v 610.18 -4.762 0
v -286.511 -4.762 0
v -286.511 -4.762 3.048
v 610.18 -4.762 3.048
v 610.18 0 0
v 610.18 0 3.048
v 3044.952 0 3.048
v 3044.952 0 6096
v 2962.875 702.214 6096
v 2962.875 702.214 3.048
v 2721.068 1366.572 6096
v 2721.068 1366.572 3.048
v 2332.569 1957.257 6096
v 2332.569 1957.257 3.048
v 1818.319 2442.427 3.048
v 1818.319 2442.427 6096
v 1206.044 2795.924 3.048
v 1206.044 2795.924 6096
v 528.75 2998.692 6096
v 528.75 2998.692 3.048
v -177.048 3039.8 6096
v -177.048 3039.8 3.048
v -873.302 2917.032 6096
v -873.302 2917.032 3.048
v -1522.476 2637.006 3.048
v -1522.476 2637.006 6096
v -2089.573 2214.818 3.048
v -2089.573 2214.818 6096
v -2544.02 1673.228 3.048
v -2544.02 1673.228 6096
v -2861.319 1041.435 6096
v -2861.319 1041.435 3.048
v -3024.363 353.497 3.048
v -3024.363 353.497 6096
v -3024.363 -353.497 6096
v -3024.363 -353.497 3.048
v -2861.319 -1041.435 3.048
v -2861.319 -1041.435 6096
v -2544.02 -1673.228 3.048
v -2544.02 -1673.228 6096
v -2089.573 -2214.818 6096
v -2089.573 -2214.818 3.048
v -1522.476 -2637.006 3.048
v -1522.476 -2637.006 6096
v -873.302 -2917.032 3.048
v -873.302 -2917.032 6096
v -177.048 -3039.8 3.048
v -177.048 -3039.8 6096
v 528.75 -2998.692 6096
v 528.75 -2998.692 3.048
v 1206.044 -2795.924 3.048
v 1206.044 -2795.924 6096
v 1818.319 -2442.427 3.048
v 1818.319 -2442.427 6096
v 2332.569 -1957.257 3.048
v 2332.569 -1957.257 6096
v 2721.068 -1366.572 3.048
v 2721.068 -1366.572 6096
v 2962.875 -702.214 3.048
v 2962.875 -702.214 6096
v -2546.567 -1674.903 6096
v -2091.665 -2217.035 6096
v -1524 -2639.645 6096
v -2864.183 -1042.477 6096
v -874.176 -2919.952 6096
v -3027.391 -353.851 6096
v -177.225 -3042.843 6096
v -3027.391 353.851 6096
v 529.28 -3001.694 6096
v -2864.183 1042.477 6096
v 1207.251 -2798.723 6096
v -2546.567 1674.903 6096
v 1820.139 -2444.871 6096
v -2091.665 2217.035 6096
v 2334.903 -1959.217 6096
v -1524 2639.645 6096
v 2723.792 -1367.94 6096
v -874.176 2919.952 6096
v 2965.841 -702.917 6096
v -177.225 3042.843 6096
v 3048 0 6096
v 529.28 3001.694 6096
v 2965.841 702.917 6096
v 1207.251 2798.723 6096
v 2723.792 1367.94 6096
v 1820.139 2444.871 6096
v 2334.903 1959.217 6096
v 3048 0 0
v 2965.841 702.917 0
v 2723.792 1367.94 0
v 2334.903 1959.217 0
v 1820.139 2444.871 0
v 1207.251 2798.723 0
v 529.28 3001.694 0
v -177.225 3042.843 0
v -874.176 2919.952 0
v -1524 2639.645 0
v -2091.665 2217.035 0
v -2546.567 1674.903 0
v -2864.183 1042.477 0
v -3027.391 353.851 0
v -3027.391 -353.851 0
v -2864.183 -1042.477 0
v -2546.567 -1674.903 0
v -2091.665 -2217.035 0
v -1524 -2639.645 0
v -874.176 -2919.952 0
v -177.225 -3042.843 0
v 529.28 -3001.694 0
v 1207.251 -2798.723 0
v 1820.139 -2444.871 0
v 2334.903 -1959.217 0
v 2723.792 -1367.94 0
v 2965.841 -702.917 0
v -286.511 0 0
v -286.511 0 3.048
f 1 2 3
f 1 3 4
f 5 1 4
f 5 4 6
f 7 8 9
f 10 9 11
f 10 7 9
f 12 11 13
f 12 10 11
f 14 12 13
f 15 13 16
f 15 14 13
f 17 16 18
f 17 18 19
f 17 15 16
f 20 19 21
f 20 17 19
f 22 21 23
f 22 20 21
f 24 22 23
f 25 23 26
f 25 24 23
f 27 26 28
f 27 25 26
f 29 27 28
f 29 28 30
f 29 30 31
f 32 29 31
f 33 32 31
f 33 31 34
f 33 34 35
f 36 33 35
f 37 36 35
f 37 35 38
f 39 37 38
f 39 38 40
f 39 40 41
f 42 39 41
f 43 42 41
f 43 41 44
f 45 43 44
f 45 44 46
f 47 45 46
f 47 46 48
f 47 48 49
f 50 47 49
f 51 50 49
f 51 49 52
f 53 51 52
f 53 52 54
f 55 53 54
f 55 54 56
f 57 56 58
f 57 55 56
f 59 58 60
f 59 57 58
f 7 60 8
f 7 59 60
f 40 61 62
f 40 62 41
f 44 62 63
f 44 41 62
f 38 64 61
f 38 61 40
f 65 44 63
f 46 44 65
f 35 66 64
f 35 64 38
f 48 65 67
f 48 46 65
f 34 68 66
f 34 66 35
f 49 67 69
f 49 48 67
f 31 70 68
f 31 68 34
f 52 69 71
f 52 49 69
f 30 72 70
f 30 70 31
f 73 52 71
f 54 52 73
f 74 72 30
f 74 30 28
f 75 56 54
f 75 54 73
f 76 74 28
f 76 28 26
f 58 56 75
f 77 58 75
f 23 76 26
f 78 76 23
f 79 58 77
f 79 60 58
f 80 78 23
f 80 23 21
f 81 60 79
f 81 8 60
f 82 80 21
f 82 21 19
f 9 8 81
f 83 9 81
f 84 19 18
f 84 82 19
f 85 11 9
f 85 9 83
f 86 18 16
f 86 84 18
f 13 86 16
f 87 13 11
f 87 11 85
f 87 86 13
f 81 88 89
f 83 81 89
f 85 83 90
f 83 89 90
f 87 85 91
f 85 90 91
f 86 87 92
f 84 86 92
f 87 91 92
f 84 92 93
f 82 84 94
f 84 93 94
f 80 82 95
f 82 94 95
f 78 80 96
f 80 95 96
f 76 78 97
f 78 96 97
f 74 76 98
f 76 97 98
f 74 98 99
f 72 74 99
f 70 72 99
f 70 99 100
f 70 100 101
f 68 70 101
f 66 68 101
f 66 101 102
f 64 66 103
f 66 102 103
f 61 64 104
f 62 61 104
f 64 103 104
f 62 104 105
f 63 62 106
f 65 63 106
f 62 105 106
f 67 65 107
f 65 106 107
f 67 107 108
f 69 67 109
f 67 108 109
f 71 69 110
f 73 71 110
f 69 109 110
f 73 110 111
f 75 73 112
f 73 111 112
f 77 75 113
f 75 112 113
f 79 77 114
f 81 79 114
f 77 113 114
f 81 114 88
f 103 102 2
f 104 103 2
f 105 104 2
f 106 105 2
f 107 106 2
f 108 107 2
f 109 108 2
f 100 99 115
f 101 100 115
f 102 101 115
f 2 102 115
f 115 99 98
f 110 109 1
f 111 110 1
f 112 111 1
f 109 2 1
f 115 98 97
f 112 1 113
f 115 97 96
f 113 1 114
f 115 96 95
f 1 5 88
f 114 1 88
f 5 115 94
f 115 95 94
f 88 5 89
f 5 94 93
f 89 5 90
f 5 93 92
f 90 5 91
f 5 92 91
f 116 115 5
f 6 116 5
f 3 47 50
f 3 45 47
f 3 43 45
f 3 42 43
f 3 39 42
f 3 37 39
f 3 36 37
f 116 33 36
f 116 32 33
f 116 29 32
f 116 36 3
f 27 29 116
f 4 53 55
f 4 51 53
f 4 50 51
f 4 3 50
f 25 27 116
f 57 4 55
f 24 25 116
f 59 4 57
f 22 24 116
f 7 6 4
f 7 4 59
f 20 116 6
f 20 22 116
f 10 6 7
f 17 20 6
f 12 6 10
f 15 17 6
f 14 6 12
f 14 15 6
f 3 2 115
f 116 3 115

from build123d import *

# Parameters (mm, degrees)
F0_R     = 3048
F1_DEPTH = 6096
F2_T     = -3.048
F6_W     = 896.6910541058
F6_H     = 4.7625
F7_DEPTH = 1734.81703


# Not quite as in the source:
# - the program builds the solid bodies; features that only make, move or delete a surface that nothing else refers to are left out


with BuildPart() as f1:
    # F0 (on Top) → F1 (new body)
    with BuildSketch(Plane.XY):
        Circle(F0_R)
    extrude(amount=F1_DEPTH)

    # F2
    f2_openings = [f1.faces().sort_by_distance(p)[0] for p in [
        (0, 0, 6096),
    ]]
    offset(amount=F2_T, openings=f2_openings)

    # F6 (on Top) → F7 (cut)
    with BuildSketch(Plane.XY):
        with Locations((161.8346124887, -2.38125)):
            Rectangle(F6_W, F6_H)
    extrude(amount=F7_DEPTH, mode=Mode.SUBTRACT)


solid = f1.part
